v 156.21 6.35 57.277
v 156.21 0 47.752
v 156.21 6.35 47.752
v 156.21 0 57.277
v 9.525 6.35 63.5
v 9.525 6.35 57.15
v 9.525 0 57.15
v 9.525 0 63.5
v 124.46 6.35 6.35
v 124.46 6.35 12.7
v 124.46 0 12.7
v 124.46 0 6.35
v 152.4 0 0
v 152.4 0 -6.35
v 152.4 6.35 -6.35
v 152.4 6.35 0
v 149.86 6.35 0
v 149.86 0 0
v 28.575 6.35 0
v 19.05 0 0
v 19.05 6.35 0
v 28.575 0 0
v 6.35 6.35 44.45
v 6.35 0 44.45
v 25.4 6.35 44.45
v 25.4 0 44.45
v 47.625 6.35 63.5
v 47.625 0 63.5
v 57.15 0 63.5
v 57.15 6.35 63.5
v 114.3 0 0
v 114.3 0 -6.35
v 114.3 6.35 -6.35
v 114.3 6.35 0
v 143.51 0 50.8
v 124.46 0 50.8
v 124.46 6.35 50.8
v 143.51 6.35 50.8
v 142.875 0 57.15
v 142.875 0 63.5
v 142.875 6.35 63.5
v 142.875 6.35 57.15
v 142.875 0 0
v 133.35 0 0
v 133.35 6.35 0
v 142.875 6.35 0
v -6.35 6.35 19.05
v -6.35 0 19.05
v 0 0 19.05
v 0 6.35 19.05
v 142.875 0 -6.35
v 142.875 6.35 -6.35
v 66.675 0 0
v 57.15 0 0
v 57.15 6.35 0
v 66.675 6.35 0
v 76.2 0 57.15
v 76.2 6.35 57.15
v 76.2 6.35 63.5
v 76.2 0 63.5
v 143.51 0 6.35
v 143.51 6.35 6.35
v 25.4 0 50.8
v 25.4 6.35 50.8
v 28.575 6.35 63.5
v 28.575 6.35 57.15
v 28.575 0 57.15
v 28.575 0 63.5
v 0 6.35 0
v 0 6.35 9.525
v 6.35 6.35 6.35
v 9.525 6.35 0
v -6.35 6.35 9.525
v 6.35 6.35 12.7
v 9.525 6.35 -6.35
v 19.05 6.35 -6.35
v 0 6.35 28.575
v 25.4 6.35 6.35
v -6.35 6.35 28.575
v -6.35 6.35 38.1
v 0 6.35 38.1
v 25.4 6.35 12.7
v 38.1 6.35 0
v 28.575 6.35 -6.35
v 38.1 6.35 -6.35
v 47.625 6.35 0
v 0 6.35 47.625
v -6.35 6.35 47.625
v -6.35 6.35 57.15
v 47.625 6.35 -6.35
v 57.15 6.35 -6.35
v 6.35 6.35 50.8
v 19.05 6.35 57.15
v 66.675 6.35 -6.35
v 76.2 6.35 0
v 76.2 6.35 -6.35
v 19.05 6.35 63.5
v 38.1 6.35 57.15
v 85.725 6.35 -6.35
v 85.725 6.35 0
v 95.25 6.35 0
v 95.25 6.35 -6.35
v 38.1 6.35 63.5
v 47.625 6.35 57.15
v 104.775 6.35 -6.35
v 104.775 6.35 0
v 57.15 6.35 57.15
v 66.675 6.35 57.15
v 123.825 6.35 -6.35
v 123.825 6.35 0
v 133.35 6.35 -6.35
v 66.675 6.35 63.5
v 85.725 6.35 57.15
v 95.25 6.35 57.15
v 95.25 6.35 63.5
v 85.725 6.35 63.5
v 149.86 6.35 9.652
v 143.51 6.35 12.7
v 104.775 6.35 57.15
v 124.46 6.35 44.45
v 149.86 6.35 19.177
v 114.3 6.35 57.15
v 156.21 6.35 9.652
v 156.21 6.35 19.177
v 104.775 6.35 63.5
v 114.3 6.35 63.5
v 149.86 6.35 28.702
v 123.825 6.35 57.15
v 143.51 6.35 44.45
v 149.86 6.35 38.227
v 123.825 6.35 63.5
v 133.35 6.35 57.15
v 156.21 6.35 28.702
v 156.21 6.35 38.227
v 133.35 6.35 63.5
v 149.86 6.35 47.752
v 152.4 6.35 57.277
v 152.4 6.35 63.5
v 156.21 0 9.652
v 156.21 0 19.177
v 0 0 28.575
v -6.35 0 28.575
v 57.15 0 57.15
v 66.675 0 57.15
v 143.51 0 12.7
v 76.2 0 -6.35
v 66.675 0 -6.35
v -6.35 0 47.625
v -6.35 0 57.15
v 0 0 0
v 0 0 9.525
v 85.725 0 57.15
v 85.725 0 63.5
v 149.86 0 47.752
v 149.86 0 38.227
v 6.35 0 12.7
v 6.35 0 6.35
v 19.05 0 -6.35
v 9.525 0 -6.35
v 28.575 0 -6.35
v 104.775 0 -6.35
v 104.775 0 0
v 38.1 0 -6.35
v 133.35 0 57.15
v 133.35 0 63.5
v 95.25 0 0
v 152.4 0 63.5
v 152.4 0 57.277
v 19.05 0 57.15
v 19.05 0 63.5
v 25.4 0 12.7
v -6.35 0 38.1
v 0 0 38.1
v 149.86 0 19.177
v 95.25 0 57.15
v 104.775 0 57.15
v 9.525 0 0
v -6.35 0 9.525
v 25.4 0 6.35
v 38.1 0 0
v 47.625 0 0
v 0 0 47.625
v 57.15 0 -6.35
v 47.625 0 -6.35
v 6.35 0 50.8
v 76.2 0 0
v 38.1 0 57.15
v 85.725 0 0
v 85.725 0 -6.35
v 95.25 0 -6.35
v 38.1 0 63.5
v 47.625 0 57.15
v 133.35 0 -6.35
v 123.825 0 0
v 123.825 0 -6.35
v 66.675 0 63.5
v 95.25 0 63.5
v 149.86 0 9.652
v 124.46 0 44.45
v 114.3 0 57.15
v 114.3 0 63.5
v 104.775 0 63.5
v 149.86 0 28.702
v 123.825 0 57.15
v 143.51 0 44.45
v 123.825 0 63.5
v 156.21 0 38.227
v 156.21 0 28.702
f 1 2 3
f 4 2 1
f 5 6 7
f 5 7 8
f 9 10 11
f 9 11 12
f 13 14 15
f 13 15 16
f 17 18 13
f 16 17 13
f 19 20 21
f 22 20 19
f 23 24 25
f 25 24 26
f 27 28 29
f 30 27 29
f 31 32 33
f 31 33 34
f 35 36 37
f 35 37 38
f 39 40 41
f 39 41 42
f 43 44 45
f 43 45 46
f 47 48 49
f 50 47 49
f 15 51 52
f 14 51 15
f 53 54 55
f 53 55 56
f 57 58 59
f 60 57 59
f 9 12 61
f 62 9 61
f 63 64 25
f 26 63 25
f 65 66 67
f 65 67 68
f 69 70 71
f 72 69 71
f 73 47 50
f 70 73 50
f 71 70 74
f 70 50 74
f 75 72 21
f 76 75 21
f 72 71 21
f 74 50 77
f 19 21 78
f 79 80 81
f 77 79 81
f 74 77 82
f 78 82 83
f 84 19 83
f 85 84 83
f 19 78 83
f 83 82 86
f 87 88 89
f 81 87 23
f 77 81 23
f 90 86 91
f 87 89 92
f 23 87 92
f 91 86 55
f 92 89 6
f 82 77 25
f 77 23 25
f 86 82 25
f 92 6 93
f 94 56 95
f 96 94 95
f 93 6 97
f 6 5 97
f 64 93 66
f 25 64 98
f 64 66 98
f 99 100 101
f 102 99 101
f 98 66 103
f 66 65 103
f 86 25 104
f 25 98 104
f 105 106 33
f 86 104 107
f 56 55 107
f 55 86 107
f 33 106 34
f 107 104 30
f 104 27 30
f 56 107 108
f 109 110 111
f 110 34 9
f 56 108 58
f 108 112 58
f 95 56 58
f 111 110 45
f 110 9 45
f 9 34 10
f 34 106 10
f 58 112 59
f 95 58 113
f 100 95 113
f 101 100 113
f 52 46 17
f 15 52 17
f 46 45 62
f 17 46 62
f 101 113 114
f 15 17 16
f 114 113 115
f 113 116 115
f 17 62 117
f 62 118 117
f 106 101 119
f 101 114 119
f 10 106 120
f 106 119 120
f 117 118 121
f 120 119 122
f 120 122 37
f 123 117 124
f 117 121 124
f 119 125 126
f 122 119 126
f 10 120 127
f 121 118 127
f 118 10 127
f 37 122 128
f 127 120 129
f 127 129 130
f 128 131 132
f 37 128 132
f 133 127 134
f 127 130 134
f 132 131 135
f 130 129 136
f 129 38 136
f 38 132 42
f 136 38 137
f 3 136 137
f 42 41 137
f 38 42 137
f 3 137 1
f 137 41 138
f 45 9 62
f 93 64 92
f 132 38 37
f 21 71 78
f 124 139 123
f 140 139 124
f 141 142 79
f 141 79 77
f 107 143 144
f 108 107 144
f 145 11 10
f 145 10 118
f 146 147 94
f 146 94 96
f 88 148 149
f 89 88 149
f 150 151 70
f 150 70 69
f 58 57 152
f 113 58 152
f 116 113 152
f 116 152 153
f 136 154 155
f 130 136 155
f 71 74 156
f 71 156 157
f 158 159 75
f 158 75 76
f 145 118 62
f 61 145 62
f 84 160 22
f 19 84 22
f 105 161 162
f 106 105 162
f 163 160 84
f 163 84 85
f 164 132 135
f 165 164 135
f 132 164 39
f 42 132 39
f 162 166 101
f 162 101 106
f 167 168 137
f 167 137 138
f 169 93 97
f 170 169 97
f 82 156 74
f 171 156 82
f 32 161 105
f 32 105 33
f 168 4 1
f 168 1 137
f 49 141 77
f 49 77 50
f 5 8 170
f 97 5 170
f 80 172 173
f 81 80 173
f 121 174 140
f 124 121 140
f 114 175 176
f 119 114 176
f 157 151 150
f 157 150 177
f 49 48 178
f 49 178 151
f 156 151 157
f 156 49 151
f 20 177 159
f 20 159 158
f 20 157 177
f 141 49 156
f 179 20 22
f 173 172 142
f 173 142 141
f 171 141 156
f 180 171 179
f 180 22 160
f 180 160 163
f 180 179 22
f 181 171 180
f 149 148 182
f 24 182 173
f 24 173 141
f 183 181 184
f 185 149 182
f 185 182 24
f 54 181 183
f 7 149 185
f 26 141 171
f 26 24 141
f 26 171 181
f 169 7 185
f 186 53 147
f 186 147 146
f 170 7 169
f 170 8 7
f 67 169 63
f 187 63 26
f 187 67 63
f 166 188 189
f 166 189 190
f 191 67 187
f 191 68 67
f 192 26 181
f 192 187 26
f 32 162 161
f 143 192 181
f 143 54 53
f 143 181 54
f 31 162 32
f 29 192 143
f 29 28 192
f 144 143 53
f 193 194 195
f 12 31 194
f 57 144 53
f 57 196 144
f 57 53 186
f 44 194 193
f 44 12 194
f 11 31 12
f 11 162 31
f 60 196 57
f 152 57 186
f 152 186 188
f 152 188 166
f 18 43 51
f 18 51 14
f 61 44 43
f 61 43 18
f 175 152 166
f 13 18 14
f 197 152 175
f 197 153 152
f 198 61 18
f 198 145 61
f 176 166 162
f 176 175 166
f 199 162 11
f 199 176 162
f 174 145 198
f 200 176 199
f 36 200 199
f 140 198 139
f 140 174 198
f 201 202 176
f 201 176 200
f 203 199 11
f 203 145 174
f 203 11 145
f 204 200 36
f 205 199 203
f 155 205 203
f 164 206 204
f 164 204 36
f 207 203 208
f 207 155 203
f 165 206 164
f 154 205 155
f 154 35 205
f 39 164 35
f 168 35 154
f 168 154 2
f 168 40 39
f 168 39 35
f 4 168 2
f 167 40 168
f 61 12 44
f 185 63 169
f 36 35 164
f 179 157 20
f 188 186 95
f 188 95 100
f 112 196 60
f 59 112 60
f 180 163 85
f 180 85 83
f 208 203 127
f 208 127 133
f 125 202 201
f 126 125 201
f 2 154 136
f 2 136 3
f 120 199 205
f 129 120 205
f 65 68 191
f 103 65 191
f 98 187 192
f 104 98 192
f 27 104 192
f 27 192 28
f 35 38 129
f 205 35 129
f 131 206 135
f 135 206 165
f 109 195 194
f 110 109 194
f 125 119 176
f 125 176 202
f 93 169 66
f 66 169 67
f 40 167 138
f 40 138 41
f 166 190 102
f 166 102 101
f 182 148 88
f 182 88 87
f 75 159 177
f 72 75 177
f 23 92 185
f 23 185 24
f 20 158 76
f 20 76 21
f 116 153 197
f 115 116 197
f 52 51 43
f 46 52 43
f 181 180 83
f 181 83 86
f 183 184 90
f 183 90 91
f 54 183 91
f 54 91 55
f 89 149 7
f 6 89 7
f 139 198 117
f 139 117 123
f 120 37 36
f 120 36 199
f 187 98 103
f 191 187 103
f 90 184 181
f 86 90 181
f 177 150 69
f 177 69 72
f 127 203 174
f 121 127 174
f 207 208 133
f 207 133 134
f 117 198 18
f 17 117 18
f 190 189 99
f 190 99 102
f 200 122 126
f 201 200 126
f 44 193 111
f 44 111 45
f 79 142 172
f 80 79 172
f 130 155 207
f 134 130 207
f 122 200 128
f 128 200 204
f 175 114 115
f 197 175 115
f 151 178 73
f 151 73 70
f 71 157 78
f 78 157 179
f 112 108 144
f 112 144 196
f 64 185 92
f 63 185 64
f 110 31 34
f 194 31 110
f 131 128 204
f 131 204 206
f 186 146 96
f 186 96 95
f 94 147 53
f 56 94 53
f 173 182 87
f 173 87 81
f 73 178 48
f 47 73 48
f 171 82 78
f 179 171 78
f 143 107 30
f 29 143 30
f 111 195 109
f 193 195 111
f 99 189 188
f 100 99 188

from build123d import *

# Parameters (mm, degrees)
SKETCH1_W           = 149.86
SKETCH1_H           = 57.15
SKETCH1_W_2         = 19.05
SKETCH1_H_2         = 6.35
BOSS_EXTRUDE1_DEPTH = 6.35
SKETCH2_W           = 6.35
SKETCH2_H           = 9.525
SKETCH2_W_2         = 9.525
SKETCH2_H_2         = 6.35
BOSS_EXTRUDE2_DEPTH = 6.35


with BuildPart() as part:
    # Sketch1 → Boss-Extrude1 (new body)
    with BuildSketch(Plane(origin=(0, 0, 0), x_dir=(1, 0, 0), z_dir=(0, 1, 0))):
        with Locations((74.93, -28.575)):
            Rectangle(SKETCH1_W, SKETCH1_H)
        with Locations((15.875, -47.625)):
            Rectangle(SKETCH1_W_2, SKETCH1_H_2, mode=Mode.SUBTRACT)
        with Locations((15.875, -9.525)):
            Rectangle(SKETCH1_W_2, SKETCH1_H_2, mode=Mode.SUBTRACT)
        with Locations((133.985, -47.625)):
            Rectangle(SKETCH1_W_2, SKETCH1_H_2, mode=Mode.SUBTRACT)
        with Locations((133.985, -9.525)):
            Rectangle(SKETCH1_W_2, SKETCH1_H_2, mode=Mode.SUBTRACT)
    extrude(amount=BOSS_EXTRUDE1_DEPTH)

    # Sketch2 → Boss-Extrude2 (add)
    with BuildSketch(Plane.XZ):
        with Locations((-3.175, 14.2875)):
            Rectangle(SKETCH2_W, SKETCH2_H)
        with Locations((-3.175, 33.3375)):
            Rectangle(SKETCH2_W, SKETCH2_H)
        with Locations((-3.175, 52.3875)):
            Rectangle(SKETCH2_W, SKETCH2_H)
        with Locations((153.035, 14.4145)):
            Rectangle(SKETCH2_W, SKETCH2_H)
        with Locations((33.3375, 60.325)):
            Rectangle(SKETCH2_W_2, SKETCH2_H_2)
        with Locations((14.2875, 60.325)):
            Rectangle(SKETCH2_W_2, SKETCH2_H_2)
        with Locations((52.3875, 60.325)):
            Rectangle(SKETCH2_W_2, SKETCH2_H_2)
        with Locations((71.4375, 60.325)):
            Rectangle(SKETCH2_W_2, SKETCH2_H_2)
        with Locations((90.4875, 60.325)):
            Rectangle(SKETCH2_W_2, SKETCH2_H_2)
        with Locations((109.5375, 60.325)):
            Rectangle(SKETCH2_W_2, SKETCH2_H_2)
        with Locations((128.5875, 60.325)):
            Rectangle(SKETCH2_W_2, SKETCH2_H_2)
        Polygon((142.875, 63.5), (142.875, 57.15), (149.86, 57.15), (149.86, 47.752), (156.21, 47.752), (156.21, 57.277), (152.4, 57.277), (152.4, 63.5), align=None)
        with Locations((14.2875, -3.175)):
            Rectangle(SKETCH2_W_2, SKETCH2_H_2)
        with Locations((147.6375, -3.175)):
            Rectangle(SKETCH2_W_2, SKETCH2_H_2)
        with Locations((128.5875, -3.175)):
            Rectangle(SKETCH2_W_2, SKETCH2_H_2)
        with Locations((109.5375, -3.175)):
            Rectangle(SKETCH2_W_2, SKETCH2_H_2)
        with Locations((90.4875, -3.175)):
            Rectangle(SKETCH2_W_2, SKETCH2_H_2)
        with Locations((71.4375, -3.175)):
            Rectangle(SKETCH2_W_2, SKETCH2_H_2)
        with Locations((52.3875, -3.175)):
            Rectangle(SKETCH2_W_2, SKETCH2_H_2)
        with Locations((33.3375, -3.175)):
            Rectangle(SKETCH2_W_2, SKETCH2_H_2)
        with Locations((153.035, 33.4645)):
            Rectangle(SKETCH2_W, SKETCH2_H)
    extrude(amount=-BOSS_EXTRUDE2_DEPTH)


solid = part.part
